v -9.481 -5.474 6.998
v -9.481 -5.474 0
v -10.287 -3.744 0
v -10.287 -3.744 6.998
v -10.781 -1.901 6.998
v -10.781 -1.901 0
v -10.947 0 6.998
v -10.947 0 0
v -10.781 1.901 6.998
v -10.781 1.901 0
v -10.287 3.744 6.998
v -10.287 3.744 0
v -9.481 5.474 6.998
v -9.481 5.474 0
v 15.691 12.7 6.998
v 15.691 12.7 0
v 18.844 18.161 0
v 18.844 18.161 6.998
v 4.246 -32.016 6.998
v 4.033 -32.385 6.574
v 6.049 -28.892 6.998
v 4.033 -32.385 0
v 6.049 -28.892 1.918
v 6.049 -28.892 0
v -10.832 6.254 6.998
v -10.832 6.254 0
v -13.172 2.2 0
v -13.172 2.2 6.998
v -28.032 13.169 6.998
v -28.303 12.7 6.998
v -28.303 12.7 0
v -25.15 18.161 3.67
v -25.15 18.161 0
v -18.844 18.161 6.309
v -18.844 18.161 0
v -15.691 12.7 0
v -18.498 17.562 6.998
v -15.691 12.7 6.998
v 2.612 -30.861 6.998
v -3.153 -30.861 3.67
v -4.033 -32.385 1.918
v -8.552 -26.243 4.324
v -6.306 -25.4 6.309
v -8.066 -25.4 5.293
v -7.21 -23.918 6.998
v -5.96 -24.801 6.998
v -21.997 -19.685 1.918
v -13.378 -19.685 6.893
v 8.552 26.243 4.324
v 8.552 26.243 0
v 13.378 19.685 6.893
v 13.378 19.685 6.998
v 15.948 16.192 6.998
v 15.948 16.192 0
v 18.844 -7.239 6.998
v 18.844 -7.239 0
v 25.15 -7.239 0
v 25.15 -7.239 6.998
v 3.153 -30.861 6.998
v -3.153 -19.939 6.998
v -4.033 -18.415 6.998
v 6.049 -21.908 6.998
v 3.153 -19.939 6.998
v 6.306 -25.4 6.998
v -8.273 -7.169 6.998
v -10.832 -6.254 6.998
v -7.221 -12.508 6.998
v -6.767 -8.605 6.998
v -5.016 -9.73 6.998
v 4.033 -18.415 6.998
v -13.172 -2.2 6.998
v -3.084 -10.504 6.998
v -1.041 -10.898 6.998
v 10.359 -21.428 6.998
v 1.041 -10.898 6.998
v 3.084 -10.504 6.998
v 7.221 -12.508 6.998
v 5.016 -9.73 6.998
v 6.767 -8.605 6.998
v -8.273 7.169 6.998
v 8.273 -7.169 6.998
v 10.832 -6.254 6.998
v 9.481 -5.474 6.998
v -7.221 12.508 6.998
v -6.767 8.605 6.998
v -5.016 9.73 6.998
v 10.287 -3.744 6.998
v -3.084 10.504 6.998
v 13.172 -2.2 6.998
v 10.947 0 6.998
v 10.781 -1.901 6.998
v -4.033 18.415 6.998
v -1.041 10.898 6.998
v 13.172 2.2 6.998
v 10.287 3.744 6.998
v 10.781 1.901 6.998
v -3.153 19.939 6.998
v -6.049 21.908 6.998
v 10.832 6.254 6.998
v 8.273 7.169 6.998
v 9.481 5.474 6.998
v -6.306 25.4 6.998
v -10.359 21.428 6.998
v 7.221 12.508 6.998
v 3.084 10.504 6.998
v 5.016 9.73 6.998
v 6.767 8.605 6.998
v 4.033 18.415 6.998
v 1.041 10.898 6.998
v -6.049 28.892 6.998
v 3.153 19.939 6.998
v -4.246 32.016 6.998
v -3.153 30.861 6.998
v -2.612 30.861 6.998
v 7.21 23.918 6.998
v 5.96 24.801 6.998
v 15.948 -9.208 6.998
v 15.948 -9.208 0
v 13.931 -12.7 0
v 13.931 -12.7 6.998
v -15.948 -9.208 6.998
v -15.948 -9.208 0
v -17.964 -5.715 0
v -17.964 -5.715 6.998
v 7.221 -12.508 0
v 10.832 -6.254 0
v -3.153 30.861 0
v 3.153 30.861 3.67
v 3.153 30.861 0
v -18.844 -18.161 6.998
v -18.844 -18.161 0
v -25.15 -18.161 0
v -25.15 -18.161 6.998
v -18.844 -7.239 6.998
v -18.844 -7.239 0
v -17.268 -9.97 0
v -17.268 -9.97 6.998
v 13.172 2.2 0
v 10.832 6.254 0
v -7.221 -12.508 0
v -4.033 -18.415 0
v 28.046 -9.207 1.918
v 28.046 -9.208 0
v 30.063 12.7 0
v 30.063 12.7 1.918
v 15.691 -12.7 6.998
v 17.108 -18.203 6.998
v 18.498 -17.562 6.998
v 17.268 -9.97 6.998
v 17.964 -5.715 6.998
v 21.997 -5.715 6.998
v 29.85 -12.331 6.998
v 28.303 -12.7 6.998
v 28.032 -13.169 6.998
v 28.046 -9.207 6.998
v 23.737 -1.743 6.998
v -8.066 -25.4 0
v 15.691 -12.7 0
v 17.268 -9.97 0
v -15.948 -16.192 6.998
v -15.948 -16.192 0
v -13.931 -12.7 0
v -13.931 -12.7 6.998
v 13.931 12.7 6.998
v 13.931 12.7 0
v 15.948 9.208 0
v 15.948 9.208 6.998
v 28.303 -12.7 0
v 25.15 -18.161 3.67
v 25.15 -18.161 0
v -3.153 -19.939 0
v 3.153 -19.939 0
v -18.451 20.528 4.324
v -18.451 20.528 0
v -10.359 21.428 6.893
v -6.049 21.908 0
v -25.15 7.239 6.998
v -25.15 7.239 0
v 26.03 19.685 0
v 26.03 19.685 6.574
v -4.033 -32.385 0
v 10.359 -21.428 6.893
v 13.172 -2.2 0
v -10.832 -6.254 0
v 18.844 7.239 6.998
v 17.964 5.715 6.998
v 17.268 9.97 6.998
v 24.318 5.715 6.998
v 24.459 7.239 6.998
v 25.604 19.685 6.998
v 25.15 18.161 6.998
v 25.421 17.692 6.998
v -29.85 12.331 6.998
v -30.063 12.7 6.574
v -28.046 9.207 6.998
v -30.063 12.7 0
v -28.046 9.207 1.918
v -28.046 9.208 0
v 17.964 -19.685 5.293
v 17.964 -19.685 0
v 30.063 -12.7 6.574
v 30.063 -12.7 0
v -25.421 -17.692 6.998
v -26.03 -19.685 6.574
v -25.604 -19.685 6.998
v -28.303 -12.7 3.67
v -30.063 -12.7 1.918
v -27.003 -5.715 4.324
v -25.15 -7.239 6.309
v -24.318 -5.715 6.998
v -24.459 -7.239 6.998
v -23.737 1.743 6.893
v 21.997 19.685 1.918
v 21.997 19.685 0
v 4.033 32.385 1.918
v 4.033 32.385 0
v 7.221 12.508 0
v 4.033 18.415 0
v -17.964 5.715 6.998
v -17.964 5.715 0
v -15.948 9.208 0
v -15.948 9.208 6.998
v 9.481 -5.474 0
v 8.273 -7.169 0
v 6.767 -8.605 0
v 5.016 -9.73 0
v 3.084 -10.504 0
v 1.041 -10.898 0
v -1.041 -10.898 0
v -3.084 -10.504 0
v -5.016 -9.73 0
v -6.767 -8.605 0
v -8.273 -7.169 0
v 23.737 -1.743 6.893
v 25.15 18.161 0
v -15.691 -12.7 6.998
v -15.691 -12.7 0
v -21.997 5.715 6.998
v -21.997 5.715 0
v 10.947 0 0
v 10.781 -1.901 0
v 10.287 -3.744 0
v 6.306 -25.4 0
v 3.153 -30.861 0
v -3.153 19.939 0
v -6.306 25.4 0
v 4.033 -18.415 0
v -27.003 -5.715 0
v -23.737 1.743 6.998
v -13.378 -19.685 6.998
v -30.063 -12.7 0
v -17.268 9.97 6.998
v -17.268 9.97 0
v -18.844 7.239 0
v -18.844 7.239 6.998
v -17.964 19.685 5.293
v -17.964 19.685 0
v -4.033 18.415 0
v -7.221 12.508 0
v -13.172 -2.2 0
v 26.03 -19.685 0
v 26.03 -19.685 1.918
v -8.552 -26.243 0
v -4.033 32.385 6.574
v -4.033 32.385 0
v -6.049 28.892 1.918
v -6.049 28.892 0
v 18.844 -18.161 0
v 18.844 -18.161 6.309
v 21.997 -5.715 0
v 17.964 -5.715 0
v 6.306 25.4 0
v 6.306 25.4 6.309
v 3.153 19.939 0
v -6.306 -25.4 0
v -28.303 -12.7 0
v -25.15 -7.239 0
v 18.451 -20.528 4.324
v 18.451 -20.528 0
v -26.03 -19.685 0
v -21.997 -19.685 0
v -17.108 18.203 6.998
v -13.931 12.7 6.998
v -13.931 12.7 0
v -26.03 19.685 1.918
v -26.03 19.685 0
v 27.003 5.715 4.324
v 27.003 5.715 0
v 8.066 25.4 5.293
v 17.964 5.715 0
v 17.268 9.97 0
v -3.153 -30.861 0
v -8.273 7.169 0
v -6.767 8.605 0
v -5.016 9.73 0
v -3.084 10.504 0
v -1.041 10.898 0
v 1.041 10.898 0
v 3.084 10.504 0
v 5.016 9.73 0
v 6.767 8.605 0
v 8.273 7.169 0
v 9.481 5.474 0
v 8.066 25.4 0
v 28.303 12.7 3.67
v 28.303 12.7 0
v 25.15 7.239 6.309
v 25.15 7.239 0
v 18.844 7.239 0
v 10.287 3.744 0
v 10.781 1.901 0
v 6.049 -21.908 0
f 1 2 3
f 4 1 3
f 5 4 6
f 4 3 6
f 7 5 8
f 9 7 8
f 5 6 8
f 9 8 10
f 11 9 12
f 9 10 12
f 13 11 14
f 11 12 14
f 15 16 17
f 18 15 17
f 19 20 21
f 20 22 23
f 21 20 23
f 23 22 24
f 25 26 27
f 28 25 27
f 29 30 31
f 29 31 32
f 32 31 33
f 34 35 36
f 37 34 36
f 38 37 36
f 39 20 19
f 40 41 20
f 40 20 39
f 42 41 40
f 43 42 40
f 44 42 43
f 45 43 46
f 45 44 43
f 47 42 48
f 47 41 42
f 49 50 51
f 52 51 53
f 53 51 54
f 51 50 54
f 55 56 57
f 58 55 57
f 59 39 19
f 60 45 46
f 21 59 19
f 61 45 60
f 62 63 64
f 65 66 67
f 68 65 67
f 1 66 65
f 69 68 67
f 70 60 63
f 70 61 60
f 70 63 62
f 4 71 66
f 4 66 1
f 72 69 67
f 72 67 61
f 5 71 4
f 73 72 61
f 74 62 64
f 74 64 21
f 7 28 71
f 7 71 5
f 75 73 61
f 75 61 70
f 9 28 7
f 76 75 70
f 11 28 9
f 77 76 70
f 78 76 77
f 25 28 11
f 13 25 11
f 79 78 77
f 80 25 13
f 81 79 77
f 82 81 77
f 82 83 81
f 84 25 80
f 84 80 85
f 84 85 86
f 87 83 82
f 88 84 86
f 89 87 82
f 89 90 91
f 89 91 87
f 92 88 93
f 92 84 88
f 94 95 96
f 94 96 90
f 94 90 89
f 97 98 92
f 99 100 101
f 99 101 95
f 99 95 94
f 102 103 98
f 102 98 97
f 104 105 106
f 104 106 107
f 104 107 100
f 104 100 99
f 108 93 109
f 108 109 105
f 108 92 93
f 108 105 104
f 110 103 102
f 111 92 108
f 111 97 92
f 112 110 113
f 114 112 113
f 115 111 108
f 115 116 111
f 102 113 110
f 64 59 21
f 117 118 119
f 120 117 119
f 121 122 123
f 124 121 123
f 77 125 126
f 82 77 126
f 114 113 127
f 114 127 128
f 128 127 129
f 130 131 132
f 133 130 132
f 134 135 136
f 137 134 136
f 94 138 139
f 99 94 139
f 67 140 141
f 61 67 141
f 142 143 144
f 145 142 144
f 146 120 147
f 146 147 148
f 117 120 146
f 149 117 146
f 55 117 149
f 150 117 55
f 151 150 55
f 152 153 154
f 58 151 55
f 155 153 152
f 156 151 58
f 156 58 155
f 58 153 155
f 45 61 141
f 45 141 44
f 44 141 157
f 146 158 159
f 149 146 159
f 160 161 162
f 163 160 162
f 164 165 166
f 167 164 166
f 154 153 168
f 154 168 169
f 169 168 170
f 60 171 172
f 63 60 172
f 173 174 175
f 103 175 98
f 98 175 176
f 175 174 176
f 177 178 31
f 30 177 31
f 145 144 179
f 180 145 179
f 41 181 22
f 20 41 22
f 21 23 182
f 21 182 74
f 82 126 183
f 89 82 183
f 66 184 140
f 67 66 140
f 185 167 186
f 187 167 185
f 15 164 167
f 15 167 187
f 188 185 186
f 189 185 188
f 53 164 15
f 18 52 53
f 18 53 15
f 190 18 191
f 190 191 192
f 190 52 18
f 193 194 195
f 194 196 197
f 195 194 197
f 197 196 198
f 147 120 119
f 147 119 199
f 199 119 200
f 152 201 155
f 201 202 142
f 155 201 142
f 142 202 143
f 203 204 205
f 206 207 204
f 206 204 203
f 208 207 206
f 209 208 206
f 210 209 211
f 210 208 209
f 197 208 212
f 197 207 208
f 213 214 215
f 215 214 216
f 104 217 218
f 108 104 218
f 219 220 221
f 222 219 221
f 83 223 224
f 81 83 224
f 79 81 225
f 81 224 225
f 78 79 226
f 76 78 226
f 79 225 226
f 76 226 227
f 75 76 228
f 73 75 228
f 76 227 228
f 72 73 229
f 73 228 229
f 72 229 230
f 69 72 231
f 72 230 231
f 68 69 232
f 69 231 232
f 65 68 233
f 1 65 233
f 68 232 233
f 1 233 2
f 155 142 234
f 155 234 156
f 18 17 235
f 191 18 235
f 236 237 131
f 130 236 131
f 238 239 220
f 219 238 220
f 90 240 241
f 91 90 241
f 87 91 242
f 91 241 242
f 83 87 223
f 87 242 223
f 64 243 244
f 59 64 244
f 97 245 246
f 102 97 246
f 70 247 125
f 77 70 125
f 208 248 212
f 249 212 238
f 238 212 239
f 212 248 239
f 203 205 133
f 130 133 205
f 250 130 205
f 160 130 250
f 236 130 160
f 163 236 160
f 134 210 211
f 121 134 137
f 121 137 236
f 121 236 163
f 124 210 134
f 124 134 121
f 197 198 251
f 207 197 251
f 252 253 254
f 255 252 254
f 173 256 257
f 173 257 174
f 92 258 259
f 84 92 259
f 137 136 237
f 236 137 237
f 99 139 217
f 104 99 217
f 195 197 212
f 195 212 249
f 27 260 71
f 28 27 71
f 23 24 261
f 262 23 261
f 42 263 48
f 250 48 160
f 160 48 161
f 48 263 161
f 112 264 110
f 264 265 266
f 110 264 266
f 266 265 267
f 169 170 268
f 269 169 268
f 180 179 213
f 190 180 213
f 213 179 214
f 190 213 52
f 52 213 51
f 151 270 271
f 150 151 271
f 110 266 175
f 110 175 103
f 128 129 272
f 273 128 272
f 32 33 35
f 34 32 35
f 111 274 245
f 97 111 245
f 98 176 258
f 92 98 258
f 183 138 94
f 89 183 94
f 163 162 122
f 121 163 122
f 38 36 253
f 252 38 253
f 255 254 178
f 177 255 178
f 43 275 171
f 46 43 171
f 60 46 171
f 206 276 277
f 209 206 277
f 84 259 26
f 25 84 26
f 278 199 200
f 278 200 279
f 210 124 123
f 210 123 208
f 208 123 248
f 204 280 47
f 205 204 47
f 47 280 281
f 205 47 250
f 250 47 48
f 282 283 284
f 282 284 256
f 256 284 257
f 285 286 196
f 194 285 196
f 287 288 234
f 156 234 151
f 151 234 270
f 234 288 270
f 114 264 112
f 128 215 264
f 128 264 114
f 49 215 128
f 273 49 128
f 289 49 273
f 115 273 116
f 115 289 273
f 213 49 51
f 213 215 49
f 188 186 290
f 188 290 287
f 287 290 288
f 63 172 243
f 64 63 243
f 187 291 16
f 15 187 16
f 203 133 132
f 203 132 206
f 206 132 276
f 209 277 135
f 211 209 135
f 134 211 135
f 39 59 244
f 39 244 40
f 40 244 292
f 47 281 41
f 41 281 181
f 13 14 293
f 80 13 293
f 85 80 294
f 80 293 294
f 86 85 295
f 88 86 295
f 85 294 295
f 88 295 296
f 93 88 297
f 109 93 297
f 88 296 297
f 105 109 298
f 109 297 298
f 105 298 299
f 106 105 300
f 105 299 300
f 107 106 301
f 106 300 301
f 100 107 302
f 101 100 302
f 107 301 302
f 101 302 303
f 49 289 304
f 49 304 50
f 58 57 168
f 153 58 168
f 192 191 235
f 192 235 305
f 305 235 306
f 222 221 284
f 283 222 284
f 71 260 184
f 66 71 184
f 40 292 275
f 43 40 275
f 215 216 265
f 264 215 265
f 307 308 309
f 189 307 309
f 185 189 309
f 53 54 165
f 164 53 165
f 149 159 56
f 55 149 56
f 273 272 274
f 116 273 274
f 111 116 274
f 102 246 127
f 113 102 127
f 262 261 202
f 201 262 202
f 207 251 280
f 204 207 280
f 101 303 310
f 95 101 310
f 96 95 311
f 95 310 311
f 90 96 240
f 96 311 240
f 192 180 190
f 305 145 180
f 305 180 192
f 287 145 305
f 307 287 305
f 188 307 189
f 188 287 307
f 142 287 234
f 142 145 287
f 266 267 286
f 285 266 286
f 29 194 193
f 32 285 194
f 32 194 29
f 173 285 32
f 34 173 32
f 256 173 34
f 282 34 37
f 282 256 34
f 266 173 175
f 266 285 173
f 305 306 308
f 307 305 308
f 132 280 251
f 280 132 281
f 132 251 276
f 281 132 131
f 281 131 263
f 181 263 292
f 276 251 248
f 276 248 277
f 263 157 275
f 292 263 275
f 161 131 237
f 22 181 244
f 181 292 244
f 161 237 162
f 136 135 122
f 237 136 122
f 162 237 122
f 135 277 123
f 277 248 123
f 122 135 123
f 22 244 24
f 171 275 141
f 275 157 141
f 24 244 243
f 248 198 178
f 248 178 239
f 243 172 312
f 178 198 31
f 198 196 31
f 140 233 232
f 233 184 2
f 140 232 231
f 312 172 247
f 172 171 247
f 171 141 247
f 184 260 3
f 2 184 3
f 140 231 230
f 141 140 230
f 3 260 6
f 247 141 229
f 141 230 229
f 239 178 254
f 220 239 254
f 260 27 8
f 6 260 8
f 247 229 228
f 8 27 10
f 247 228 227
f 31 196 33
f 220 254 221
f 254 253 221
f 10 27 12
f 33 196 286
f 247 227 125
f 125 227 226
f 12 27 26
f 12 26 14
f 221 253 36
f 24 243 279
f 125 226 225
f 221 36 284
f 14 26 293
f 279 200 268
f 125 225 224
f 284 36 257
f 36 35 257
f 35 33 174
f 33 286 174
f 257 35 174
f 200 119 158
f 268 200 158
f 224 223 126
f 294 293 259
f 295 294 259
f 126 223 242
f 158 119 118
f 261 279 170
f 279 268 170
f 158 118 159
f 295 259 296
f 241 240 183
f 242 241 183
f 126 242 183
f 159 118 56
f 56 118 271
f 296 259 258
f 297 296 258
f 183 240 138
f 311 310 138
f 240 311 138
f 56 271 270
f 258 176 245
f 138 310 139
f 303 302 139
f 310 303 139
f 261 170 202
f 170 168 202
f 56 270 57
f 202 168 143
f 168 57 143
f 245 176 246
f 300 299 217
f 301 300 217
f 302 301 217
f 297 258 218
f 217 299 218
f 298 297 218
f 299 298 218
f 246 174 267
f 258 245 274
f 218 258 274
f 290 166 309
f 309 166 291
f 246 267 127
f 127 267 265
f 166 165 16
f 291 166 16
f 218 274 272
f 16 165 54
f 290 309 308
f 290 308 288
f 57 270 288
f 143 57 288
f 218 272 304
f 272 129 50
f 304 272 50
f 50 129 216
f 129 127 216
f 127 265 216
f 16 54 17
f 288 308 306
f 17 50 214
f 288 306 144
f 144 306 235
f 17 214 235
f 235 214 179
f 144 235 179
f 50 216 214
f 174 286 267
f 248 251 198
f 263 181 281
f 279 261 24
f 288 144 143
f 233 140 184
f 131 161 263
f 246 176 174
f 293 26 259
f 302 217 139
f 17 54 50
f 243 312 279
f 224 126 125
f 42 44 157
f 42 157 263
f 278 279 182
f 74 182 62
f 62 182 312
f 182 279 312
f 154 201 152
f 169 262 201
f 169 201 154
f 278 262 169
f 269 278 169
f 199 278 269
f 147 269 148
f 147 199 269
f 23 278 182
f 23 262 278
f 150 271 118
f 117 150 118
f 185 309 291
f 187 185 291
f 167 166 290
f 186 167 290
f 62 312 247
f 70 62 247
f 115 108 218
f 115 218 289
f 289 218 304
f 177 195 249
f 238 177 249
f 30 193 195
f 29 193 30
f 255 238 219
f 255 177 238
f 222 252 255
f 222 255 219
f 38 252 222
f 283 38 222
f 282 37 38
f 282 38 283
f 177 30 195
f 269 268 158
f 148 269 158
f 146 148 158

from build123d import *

# Parameters (mm, degrees)
F1_DEPTH     = 6.9977
F2_T4_DEPTH  = 48.1283993469
F2_T9_DEPTH  = 48.1283993469
F2_T14_DEPTH = 48.1283993469
F2_T19_DEPTH = 48.1283993469
F2_T24_DEPTH = 48.1283993469
F2_T29_DEPTH = 48.1283993469
F3_SIZE      = 2.54


# Not quite as in the source:
# - a fillet or chamfer that OpenCascade refuses, or shapes differently, is made with other operations: its cross-section is extruded or revolved along the edge and cut away or added
# - a feature names something its author has since deleted; it is built from what else it names


with BuildPart() as f1:
    # F0 (on Top) → F1 (new body)
    with BuildSketch(Plane.XY):
        Polygon((-13.9314619955, -12.7), (-15.9478578107, -9.2075), (-17.9642536258, -5.715), (-26.0298368864, -5.715), (-30.0626285167, -12.7), (-26.0298368864, -19.685), (-21.9970452561, -19.685), (-17.9642536258, -19.685), (-15.9478578107, -16.1925), align=None)
        Polygon((-18.8441354361, -7.239), (-17.2676805261, -9.9695), (-15.691225616, -12.7), (-18.8441354361, -18.161), (-25.1499550762, -18.161), (-28.3028648962, -12.7), (-25.1499550762, -7.239), align=None, mode=Mode.SUBTRACT)
        with BuildLine():
            ThreePointArc((-9.4807265054, -5.4737), (-10.9474, 0), (-9.4807265054, 5.4737))
            Line((-9.4807265054, 5.4737), (-10.8318467228, 6.2537696213))
            Line((-10.8318467228, 6.2537696213), (-14.4424622971, 0))
            Line((-14.4424622971, 0), (-10.8318467228, -6.2537696213))
            Line((-10.8318467228, -6.2537696213), (-9.4807265054, -5.4737))
        make_face()
        Polygon((-17.9642536258, 5.715), (-15.9478578107, 9.2075), (-13.9314619955, 12.7), (-17.9642536258, 19.685), (-26.0298368864, 19.685), (-30.0626285167, 12.7), (-28.0462327016, 9.2075), (-26.0298368864, 5.715), (-21.9970452561, 5.715), align=None)
        Polygon((-15.691225616, 12.7), (-17.2676805261, 9.9695), (-18.8441354361, 7.239), (-25.1499550762, 7.239), (-28.3028648962, 12.7), (-25.1499550762, 18.161), (-18.8441354361, 18.161), align=None, mode=Mode.SUBTRACT)
        Polygon((-27.0032693489, -5.715), (-21.9970452561, 5.715), (-26.0298368864, 5.715), (-28.0462327016, 9.2075), (-30.0626285167, -12.7), align=None)
        Polygon((-18.4509698571, 20.5280172414), (-6.0491874454, 21.9075), (-8.0655832606, 25.4), (-6.0491874454, 28.8925), (-26.0298368864, 19.685), align=None)
        Polygon((-4.0327916303, 18.415), (4.0327916303, 18.415), (8.0655832606, 25.4), (4.0327916303, 32.385), (-4.0327916303, 32.385), (-6.0491874454, 28.8925), (-8.0655832606, 25.4), (-6.0491874454, 21.9075), align=None)
        Polygon((-6.3058196401, 25.4), (-3.15290982, 30.861), (3.15290982, 30.861), (6.3058196401, 25.4), (3.15290982, 19.939), (-3.15290982, 19.939), align=None, mode=Mode.SUBTRACT)
        Polygon((8.5522994918, 26.2430172414), (15.9478578107, 16.1925), (17.9642536258, 19.685), (21.9970452561, 19.685), (4.0327916303, 32.385), align=None)
        Polygon((27.0032693489, 5.715), (21.9970452561, -5.715), (26.0298368864, -5.715), (28.0462327016, -9.2075), (30.0626285167, 12.7), align=None)
        Polygon((13.9314619955, 12.7), (15.9478578107, 9.2075), (17.9642536258, 5.715), (26.0298368864, 5.715), (30.0626285167, 12.7), (26.0298368864, 19.685), (21.9970452561, 19.685), (17.9642536258, 19.685), (15.9478578107, 16.1925), align=None)
        Polygon((18.8441354361, 7.239), (17.2676805261, 9.9695), (15.691225616, 12.7), (18.8441354361, 18.161), (25.1499550762, 18.161), (28.3028648962, 12.7), (25.1499550762, 7.239), align=None, mode=Mode.SUBTRACT)
        Polygon((18.4509698571, -20.5280172414), (6.0491874454, -21.9075), (8.0655832606, -25.4), (6.0491874454, -28.8925), (26.0298368864, -19.685), align=None)
        Polygon((6.0491874454, -21.9075), (4.0327916303, -18.415), (-4.0327916303, -18.415), (-8.0655832606, -25.4), (-4.0327916303, -32.385), (4.0327916303, -32.385), (6.0491874454, -28.8925), (8.0655832606, -25.4), align=None)
        Polygon((-6.3058196401, -25.4), (-3.15290982, -19.939), (3.15290982, -19.939), (6.3058196401, -25.4), (3.15290982, -30.861), (-3.15290982, -30.861), align=None, mode=Mode.SUBTRACT)
        Polygon((-8.5522994918, -26.2430172414), (-15.9478578107, -16.1925), (-17.9642536258, -19.685), (-21.9970452561, -19.685), (-4.0327916303, -32.385), align=None)
        with BuildLine():
            Line((10.8318467228, -6.2537696213), (9.4807265054, -5.4737))
            ThreePointArc((9.4807265054, -5.4737), (0, -10.9474), (-9.4807265054, -5.4737))
            Line((-9.4807265054, -5.4737), (-10.8318467228, -6.2537696213))
            Line((-10.8318467228, -6.2537696213), (-7.2212311486, -12.5075392425))
            Line((-7.2212311486, -12.5075392425), (7.2212311486, -12.5075392425))
            Line((7.2212311486, -12.5075392425), (10.8318467228, -6.2537696213))
        make_face()
        with BuildLine():
            ThreePointArc((9.4807265054, 5.4737), (10.5743763907, 2.8333956144), (10.9474, 0))
            ThreePointArc((10.9474, 0), (10.5743763907, -2.8333956144), (9.4807265054, -5.4737))
            Line((9.4807265054, -5.4737), (10.8318467228, -6.2537696213))
            Line((10.8318467228, -6.2537696213), (14.4424622971, 0))
            Line((14.4424622971, 0), (10.8318467228, 6.2537696213))
            Line((10.8318467228, 6.2537696213), (9.4807265054, 5.4737))
        make_face()
        with BuildLine():
            ThreePointArc((-9.4807265054, 5.4737), (0, 10.9474), (9.4807265054, 5.4737))
            Line((9.4807265054, 5.4737), (10.8318467228, 6.2537696213))
            Line((10.8318467228, 6.2537696213), (7.2212311486, 12.5075392425))
            Line((7.2212311486, 12.5075392425), (-7.2212311486, 12.5075392425))
            Line((-7.2212311486, 12.5075392425), (-10.8318467228, 6.2537696213))
            Line((-10.8318467228, 6.2537696213), (-9.4807265054, 5.4737))
        make_face()
        Polygon((17.9642536258, -5.715), (15.9478578107, -9.2075), (13.9314619955, -12.7), (17.9642536258, -19.685), (26.0298368864, -19.685), (30.0626285167, -12.7), (28.0462327016, -9.2075), (26.0298368864, -5.715), (21.9970452561, -5.715), align=None)
        Polygon((15.691225616, -12.7), (17.2676805261, -9.9695), (18.8441354361, -7.239), (25.1499550762, -7.239), (28.3028648962, -12.7), (25.1499550762, -18.161), (18.8441354361, -18.161), align=None, mode=Mode.SUBTRACT)
        Polygon((-26.0298368864, 19.685), (-17.9642536258, 19.685), (-18.4509698571, 20.5280172414), align=None)
        Polygon((30.0626285167, 12.7), (26.0298368864, 5.715), (27.0032693489, 5.715), align=None)
        Polygon((26.0298368864, -19.685), (17.9642536258, -19.685), (18.4509698571, -20.5280172414), align=None)
        Polygon((-30.0626285167, -12.7), (-26.0298368864, -5.715), (-27.0032693489, -5.715), align=None)
        Polygon((-7.2212311486, 12.5075392425), (7.2212311486, 12.5075392425), (4.0327916303, 18.415), (-4.0327916303, 18.415), align=None)
        Polygon((4.0327916303, -18.415), (7.2212311486, -12.5075392425), (-7.2212311486, -12.5075392425), (-4.0327916303, -18.415), align=None)
        Polygon((-4.0327916303, -32.385), (-8.0655832606, -25.4), (-8.5522994918, -26.2430172414), align=None)
        Polygon((4.0327916303, 32.385), (8.0655832606, 25.4), (8.5522994918, 26.2430172414), align=None)
    extrude(amount=F1_DEPTH)

    # F2: chamfer of 5.08 on 6 edges, made by hand


with BuildPart() as f2_tool2:
    # F2_s3 → F2_t4 (new body)
    with BuildSketch(Plane(origin=(-1.8021315116, -19.5795864057, 0), x_dir=(0, 0, 1), z_dir=(0.0916539378, 0.9957909197, 0))):
        Polygon((1.9177, 28.7720874875), (6.9977, 23.6920874875), (6.9977, 28.7720874875), align=None)
    extrude(amount=F2_T4_DEPTH)

    split(bisect_by=Plane(origin=(17.0477100735, 9.8425, 0), x_dir=(0, 0, 1), z_dir=(0.8660254038, 0.5, 0)), keep=Keep.TOP)


with BuildPart() as f1_1:
    add(f1.part)

    # F2_t1: cut F2_tool2
    add(f2_tool2.part, mode=Mode.SUBTRACT)


with BuildPart() as f2_tool7:
    # F2_s8 → F2_t9 (new body)
    with BuildSketch(Plane(origin=(16.0553534671, -11.3504848729, 0), x_dir=(0, 0, 1), z_dir=(-0.8165532644, 0.5772700984, 0))):
        Polygon((1.9177, 28.7720874875), (6.9977, 23.6920874875), (6.9977, 28.7720874875), align=None)
    extrude(amount=F2_T9_DEPTH)

    split(bisect_by=Plane.XZ.offset(-19.685), keep=Keep.BOTTOM)


with BuildPart() as f1_2:
    add(f1_1.part)

    # F2_t6: cut F2_tool7
    add(f2_tool7.part, mode=Mode.SUBTRACT)


with BuildPart() as f2_tool12:
    # F2_s13 → F2_t14 (new body)
    with BuildSketch(Plane(origin=(17.8574849787, 8.2291015328, 0), x_dir=(0, 0, 1), z_dir=(-0.9082072022, -0.4185208213, 0))):
        Polygon((1.9177, 28.7720874875), (6.9977, 23.6920874875), (6.9977, 28.7720874875), align=None)
    extrude(amount=F2_T14_DEPTH)

    split(bisect_by=Plane(origin=(-17.0477100735, 9.8425, 0), x_dir=(0, 0, 1), z_dir=(-0.8660254038, 0.5, 0)), keep=Keep.TOP)


with BuildPart() as f1_3:
    add(f1_2.part)

    # F2_t11: cut F2_tool12
    add(f2_tool12.part, mode=Mode.SUBTRACT)


with BuildPart() as f2_tool17:
    # F2_s18 → F2_t19 (new body)
    with BuildSketch(Plane(origin=(1.8021315116, 19.5795864057, 0), x_dir=(0, 0, 1), z_dir=(-0.0916539378, -0.9957909197, 0))):
        Polygon((1.9177, 28.7720874875), (6.9977, 23.6920874875), (6.9977, 28.7720874875), align=None)
    extrude(amount=F2_T19_DEPTH)

    split(bisect_by=Plane(origin=(-17.0477100735, -9.8425, 0), x_dir=(0, 0, 1), z_dir=(-0.8660254038, -0.5, 0)), keep=Keep.TOP)


with BuildPart() as f1_4:
    add(f1_3.part)

    # F2_t16: cut F2_tool17
    add(f2_tool17.part, mode=Mode.SUBTRACT)


with BuildPart() as f2_tool22:
    # F2_s23 → F2_t24 (new body)
    with BuildSketch(Plane(origin=(-16.0553534671, 11.3504848729, 0), x_dir=(0, 0, 1), z_dir=(0.8165532644, -0.5772700984, 0))):
        Polygon((1.9177, 28.7720874875), (6.9977, 23.6920874875), (6.9977, 28.7720874875), align=None)
    extrude(amount=F2_T24_DEPTH)

    split(bisect_by=Plane.XZ.offset(19.685), keep=Keep.TOP)


with BuildPart() as f1_5:
    add(f1_4.part)

    # F2_t21: cut F2_tool22
    add(f2_tool22.part, mode=Mode.SUBTRACT)


with BuildPart() as f2_tool27:
    # F2_s28 → F2_t29 (new body)
    with BuildSketch(Plane(origin=(-17.8574849787, -8.2291015328, 0), x_dir=(0, 0, 1), z_dir=(0.9082072022, 0.4185208213, 0))):
        Polygon((1.9177, 28.7720874875), (6.9977, 23.6920874875), (6.9977, 28.7720874875), align=None)
    extrude(amount=F2_T29_DEPTH)

    split(bisect_by=Plane(origin=(17.0477100735, -9.8425, 0), x_dir=(0, 0, 1), z_dir=(0.8660254038, -0.5, 0)), keep=Keep.TOP)


with BuildPart() as f1_6:
    add(f1_5.part)

    # F2_t26: cut F2_tool27
    add(f2_tool27.part, mode=Mode.SUBTRACT)

    # F3
    f3_edges = [f1_6.edges().sort_by_distance(p)[0] for p in [
        (-14.442462, 0, 3.49885),
        (14.442462, 0, 3.49885),
    ]]
    chamfer(f3_edges, length=F3_SIZE)


solid = f1_6.part
